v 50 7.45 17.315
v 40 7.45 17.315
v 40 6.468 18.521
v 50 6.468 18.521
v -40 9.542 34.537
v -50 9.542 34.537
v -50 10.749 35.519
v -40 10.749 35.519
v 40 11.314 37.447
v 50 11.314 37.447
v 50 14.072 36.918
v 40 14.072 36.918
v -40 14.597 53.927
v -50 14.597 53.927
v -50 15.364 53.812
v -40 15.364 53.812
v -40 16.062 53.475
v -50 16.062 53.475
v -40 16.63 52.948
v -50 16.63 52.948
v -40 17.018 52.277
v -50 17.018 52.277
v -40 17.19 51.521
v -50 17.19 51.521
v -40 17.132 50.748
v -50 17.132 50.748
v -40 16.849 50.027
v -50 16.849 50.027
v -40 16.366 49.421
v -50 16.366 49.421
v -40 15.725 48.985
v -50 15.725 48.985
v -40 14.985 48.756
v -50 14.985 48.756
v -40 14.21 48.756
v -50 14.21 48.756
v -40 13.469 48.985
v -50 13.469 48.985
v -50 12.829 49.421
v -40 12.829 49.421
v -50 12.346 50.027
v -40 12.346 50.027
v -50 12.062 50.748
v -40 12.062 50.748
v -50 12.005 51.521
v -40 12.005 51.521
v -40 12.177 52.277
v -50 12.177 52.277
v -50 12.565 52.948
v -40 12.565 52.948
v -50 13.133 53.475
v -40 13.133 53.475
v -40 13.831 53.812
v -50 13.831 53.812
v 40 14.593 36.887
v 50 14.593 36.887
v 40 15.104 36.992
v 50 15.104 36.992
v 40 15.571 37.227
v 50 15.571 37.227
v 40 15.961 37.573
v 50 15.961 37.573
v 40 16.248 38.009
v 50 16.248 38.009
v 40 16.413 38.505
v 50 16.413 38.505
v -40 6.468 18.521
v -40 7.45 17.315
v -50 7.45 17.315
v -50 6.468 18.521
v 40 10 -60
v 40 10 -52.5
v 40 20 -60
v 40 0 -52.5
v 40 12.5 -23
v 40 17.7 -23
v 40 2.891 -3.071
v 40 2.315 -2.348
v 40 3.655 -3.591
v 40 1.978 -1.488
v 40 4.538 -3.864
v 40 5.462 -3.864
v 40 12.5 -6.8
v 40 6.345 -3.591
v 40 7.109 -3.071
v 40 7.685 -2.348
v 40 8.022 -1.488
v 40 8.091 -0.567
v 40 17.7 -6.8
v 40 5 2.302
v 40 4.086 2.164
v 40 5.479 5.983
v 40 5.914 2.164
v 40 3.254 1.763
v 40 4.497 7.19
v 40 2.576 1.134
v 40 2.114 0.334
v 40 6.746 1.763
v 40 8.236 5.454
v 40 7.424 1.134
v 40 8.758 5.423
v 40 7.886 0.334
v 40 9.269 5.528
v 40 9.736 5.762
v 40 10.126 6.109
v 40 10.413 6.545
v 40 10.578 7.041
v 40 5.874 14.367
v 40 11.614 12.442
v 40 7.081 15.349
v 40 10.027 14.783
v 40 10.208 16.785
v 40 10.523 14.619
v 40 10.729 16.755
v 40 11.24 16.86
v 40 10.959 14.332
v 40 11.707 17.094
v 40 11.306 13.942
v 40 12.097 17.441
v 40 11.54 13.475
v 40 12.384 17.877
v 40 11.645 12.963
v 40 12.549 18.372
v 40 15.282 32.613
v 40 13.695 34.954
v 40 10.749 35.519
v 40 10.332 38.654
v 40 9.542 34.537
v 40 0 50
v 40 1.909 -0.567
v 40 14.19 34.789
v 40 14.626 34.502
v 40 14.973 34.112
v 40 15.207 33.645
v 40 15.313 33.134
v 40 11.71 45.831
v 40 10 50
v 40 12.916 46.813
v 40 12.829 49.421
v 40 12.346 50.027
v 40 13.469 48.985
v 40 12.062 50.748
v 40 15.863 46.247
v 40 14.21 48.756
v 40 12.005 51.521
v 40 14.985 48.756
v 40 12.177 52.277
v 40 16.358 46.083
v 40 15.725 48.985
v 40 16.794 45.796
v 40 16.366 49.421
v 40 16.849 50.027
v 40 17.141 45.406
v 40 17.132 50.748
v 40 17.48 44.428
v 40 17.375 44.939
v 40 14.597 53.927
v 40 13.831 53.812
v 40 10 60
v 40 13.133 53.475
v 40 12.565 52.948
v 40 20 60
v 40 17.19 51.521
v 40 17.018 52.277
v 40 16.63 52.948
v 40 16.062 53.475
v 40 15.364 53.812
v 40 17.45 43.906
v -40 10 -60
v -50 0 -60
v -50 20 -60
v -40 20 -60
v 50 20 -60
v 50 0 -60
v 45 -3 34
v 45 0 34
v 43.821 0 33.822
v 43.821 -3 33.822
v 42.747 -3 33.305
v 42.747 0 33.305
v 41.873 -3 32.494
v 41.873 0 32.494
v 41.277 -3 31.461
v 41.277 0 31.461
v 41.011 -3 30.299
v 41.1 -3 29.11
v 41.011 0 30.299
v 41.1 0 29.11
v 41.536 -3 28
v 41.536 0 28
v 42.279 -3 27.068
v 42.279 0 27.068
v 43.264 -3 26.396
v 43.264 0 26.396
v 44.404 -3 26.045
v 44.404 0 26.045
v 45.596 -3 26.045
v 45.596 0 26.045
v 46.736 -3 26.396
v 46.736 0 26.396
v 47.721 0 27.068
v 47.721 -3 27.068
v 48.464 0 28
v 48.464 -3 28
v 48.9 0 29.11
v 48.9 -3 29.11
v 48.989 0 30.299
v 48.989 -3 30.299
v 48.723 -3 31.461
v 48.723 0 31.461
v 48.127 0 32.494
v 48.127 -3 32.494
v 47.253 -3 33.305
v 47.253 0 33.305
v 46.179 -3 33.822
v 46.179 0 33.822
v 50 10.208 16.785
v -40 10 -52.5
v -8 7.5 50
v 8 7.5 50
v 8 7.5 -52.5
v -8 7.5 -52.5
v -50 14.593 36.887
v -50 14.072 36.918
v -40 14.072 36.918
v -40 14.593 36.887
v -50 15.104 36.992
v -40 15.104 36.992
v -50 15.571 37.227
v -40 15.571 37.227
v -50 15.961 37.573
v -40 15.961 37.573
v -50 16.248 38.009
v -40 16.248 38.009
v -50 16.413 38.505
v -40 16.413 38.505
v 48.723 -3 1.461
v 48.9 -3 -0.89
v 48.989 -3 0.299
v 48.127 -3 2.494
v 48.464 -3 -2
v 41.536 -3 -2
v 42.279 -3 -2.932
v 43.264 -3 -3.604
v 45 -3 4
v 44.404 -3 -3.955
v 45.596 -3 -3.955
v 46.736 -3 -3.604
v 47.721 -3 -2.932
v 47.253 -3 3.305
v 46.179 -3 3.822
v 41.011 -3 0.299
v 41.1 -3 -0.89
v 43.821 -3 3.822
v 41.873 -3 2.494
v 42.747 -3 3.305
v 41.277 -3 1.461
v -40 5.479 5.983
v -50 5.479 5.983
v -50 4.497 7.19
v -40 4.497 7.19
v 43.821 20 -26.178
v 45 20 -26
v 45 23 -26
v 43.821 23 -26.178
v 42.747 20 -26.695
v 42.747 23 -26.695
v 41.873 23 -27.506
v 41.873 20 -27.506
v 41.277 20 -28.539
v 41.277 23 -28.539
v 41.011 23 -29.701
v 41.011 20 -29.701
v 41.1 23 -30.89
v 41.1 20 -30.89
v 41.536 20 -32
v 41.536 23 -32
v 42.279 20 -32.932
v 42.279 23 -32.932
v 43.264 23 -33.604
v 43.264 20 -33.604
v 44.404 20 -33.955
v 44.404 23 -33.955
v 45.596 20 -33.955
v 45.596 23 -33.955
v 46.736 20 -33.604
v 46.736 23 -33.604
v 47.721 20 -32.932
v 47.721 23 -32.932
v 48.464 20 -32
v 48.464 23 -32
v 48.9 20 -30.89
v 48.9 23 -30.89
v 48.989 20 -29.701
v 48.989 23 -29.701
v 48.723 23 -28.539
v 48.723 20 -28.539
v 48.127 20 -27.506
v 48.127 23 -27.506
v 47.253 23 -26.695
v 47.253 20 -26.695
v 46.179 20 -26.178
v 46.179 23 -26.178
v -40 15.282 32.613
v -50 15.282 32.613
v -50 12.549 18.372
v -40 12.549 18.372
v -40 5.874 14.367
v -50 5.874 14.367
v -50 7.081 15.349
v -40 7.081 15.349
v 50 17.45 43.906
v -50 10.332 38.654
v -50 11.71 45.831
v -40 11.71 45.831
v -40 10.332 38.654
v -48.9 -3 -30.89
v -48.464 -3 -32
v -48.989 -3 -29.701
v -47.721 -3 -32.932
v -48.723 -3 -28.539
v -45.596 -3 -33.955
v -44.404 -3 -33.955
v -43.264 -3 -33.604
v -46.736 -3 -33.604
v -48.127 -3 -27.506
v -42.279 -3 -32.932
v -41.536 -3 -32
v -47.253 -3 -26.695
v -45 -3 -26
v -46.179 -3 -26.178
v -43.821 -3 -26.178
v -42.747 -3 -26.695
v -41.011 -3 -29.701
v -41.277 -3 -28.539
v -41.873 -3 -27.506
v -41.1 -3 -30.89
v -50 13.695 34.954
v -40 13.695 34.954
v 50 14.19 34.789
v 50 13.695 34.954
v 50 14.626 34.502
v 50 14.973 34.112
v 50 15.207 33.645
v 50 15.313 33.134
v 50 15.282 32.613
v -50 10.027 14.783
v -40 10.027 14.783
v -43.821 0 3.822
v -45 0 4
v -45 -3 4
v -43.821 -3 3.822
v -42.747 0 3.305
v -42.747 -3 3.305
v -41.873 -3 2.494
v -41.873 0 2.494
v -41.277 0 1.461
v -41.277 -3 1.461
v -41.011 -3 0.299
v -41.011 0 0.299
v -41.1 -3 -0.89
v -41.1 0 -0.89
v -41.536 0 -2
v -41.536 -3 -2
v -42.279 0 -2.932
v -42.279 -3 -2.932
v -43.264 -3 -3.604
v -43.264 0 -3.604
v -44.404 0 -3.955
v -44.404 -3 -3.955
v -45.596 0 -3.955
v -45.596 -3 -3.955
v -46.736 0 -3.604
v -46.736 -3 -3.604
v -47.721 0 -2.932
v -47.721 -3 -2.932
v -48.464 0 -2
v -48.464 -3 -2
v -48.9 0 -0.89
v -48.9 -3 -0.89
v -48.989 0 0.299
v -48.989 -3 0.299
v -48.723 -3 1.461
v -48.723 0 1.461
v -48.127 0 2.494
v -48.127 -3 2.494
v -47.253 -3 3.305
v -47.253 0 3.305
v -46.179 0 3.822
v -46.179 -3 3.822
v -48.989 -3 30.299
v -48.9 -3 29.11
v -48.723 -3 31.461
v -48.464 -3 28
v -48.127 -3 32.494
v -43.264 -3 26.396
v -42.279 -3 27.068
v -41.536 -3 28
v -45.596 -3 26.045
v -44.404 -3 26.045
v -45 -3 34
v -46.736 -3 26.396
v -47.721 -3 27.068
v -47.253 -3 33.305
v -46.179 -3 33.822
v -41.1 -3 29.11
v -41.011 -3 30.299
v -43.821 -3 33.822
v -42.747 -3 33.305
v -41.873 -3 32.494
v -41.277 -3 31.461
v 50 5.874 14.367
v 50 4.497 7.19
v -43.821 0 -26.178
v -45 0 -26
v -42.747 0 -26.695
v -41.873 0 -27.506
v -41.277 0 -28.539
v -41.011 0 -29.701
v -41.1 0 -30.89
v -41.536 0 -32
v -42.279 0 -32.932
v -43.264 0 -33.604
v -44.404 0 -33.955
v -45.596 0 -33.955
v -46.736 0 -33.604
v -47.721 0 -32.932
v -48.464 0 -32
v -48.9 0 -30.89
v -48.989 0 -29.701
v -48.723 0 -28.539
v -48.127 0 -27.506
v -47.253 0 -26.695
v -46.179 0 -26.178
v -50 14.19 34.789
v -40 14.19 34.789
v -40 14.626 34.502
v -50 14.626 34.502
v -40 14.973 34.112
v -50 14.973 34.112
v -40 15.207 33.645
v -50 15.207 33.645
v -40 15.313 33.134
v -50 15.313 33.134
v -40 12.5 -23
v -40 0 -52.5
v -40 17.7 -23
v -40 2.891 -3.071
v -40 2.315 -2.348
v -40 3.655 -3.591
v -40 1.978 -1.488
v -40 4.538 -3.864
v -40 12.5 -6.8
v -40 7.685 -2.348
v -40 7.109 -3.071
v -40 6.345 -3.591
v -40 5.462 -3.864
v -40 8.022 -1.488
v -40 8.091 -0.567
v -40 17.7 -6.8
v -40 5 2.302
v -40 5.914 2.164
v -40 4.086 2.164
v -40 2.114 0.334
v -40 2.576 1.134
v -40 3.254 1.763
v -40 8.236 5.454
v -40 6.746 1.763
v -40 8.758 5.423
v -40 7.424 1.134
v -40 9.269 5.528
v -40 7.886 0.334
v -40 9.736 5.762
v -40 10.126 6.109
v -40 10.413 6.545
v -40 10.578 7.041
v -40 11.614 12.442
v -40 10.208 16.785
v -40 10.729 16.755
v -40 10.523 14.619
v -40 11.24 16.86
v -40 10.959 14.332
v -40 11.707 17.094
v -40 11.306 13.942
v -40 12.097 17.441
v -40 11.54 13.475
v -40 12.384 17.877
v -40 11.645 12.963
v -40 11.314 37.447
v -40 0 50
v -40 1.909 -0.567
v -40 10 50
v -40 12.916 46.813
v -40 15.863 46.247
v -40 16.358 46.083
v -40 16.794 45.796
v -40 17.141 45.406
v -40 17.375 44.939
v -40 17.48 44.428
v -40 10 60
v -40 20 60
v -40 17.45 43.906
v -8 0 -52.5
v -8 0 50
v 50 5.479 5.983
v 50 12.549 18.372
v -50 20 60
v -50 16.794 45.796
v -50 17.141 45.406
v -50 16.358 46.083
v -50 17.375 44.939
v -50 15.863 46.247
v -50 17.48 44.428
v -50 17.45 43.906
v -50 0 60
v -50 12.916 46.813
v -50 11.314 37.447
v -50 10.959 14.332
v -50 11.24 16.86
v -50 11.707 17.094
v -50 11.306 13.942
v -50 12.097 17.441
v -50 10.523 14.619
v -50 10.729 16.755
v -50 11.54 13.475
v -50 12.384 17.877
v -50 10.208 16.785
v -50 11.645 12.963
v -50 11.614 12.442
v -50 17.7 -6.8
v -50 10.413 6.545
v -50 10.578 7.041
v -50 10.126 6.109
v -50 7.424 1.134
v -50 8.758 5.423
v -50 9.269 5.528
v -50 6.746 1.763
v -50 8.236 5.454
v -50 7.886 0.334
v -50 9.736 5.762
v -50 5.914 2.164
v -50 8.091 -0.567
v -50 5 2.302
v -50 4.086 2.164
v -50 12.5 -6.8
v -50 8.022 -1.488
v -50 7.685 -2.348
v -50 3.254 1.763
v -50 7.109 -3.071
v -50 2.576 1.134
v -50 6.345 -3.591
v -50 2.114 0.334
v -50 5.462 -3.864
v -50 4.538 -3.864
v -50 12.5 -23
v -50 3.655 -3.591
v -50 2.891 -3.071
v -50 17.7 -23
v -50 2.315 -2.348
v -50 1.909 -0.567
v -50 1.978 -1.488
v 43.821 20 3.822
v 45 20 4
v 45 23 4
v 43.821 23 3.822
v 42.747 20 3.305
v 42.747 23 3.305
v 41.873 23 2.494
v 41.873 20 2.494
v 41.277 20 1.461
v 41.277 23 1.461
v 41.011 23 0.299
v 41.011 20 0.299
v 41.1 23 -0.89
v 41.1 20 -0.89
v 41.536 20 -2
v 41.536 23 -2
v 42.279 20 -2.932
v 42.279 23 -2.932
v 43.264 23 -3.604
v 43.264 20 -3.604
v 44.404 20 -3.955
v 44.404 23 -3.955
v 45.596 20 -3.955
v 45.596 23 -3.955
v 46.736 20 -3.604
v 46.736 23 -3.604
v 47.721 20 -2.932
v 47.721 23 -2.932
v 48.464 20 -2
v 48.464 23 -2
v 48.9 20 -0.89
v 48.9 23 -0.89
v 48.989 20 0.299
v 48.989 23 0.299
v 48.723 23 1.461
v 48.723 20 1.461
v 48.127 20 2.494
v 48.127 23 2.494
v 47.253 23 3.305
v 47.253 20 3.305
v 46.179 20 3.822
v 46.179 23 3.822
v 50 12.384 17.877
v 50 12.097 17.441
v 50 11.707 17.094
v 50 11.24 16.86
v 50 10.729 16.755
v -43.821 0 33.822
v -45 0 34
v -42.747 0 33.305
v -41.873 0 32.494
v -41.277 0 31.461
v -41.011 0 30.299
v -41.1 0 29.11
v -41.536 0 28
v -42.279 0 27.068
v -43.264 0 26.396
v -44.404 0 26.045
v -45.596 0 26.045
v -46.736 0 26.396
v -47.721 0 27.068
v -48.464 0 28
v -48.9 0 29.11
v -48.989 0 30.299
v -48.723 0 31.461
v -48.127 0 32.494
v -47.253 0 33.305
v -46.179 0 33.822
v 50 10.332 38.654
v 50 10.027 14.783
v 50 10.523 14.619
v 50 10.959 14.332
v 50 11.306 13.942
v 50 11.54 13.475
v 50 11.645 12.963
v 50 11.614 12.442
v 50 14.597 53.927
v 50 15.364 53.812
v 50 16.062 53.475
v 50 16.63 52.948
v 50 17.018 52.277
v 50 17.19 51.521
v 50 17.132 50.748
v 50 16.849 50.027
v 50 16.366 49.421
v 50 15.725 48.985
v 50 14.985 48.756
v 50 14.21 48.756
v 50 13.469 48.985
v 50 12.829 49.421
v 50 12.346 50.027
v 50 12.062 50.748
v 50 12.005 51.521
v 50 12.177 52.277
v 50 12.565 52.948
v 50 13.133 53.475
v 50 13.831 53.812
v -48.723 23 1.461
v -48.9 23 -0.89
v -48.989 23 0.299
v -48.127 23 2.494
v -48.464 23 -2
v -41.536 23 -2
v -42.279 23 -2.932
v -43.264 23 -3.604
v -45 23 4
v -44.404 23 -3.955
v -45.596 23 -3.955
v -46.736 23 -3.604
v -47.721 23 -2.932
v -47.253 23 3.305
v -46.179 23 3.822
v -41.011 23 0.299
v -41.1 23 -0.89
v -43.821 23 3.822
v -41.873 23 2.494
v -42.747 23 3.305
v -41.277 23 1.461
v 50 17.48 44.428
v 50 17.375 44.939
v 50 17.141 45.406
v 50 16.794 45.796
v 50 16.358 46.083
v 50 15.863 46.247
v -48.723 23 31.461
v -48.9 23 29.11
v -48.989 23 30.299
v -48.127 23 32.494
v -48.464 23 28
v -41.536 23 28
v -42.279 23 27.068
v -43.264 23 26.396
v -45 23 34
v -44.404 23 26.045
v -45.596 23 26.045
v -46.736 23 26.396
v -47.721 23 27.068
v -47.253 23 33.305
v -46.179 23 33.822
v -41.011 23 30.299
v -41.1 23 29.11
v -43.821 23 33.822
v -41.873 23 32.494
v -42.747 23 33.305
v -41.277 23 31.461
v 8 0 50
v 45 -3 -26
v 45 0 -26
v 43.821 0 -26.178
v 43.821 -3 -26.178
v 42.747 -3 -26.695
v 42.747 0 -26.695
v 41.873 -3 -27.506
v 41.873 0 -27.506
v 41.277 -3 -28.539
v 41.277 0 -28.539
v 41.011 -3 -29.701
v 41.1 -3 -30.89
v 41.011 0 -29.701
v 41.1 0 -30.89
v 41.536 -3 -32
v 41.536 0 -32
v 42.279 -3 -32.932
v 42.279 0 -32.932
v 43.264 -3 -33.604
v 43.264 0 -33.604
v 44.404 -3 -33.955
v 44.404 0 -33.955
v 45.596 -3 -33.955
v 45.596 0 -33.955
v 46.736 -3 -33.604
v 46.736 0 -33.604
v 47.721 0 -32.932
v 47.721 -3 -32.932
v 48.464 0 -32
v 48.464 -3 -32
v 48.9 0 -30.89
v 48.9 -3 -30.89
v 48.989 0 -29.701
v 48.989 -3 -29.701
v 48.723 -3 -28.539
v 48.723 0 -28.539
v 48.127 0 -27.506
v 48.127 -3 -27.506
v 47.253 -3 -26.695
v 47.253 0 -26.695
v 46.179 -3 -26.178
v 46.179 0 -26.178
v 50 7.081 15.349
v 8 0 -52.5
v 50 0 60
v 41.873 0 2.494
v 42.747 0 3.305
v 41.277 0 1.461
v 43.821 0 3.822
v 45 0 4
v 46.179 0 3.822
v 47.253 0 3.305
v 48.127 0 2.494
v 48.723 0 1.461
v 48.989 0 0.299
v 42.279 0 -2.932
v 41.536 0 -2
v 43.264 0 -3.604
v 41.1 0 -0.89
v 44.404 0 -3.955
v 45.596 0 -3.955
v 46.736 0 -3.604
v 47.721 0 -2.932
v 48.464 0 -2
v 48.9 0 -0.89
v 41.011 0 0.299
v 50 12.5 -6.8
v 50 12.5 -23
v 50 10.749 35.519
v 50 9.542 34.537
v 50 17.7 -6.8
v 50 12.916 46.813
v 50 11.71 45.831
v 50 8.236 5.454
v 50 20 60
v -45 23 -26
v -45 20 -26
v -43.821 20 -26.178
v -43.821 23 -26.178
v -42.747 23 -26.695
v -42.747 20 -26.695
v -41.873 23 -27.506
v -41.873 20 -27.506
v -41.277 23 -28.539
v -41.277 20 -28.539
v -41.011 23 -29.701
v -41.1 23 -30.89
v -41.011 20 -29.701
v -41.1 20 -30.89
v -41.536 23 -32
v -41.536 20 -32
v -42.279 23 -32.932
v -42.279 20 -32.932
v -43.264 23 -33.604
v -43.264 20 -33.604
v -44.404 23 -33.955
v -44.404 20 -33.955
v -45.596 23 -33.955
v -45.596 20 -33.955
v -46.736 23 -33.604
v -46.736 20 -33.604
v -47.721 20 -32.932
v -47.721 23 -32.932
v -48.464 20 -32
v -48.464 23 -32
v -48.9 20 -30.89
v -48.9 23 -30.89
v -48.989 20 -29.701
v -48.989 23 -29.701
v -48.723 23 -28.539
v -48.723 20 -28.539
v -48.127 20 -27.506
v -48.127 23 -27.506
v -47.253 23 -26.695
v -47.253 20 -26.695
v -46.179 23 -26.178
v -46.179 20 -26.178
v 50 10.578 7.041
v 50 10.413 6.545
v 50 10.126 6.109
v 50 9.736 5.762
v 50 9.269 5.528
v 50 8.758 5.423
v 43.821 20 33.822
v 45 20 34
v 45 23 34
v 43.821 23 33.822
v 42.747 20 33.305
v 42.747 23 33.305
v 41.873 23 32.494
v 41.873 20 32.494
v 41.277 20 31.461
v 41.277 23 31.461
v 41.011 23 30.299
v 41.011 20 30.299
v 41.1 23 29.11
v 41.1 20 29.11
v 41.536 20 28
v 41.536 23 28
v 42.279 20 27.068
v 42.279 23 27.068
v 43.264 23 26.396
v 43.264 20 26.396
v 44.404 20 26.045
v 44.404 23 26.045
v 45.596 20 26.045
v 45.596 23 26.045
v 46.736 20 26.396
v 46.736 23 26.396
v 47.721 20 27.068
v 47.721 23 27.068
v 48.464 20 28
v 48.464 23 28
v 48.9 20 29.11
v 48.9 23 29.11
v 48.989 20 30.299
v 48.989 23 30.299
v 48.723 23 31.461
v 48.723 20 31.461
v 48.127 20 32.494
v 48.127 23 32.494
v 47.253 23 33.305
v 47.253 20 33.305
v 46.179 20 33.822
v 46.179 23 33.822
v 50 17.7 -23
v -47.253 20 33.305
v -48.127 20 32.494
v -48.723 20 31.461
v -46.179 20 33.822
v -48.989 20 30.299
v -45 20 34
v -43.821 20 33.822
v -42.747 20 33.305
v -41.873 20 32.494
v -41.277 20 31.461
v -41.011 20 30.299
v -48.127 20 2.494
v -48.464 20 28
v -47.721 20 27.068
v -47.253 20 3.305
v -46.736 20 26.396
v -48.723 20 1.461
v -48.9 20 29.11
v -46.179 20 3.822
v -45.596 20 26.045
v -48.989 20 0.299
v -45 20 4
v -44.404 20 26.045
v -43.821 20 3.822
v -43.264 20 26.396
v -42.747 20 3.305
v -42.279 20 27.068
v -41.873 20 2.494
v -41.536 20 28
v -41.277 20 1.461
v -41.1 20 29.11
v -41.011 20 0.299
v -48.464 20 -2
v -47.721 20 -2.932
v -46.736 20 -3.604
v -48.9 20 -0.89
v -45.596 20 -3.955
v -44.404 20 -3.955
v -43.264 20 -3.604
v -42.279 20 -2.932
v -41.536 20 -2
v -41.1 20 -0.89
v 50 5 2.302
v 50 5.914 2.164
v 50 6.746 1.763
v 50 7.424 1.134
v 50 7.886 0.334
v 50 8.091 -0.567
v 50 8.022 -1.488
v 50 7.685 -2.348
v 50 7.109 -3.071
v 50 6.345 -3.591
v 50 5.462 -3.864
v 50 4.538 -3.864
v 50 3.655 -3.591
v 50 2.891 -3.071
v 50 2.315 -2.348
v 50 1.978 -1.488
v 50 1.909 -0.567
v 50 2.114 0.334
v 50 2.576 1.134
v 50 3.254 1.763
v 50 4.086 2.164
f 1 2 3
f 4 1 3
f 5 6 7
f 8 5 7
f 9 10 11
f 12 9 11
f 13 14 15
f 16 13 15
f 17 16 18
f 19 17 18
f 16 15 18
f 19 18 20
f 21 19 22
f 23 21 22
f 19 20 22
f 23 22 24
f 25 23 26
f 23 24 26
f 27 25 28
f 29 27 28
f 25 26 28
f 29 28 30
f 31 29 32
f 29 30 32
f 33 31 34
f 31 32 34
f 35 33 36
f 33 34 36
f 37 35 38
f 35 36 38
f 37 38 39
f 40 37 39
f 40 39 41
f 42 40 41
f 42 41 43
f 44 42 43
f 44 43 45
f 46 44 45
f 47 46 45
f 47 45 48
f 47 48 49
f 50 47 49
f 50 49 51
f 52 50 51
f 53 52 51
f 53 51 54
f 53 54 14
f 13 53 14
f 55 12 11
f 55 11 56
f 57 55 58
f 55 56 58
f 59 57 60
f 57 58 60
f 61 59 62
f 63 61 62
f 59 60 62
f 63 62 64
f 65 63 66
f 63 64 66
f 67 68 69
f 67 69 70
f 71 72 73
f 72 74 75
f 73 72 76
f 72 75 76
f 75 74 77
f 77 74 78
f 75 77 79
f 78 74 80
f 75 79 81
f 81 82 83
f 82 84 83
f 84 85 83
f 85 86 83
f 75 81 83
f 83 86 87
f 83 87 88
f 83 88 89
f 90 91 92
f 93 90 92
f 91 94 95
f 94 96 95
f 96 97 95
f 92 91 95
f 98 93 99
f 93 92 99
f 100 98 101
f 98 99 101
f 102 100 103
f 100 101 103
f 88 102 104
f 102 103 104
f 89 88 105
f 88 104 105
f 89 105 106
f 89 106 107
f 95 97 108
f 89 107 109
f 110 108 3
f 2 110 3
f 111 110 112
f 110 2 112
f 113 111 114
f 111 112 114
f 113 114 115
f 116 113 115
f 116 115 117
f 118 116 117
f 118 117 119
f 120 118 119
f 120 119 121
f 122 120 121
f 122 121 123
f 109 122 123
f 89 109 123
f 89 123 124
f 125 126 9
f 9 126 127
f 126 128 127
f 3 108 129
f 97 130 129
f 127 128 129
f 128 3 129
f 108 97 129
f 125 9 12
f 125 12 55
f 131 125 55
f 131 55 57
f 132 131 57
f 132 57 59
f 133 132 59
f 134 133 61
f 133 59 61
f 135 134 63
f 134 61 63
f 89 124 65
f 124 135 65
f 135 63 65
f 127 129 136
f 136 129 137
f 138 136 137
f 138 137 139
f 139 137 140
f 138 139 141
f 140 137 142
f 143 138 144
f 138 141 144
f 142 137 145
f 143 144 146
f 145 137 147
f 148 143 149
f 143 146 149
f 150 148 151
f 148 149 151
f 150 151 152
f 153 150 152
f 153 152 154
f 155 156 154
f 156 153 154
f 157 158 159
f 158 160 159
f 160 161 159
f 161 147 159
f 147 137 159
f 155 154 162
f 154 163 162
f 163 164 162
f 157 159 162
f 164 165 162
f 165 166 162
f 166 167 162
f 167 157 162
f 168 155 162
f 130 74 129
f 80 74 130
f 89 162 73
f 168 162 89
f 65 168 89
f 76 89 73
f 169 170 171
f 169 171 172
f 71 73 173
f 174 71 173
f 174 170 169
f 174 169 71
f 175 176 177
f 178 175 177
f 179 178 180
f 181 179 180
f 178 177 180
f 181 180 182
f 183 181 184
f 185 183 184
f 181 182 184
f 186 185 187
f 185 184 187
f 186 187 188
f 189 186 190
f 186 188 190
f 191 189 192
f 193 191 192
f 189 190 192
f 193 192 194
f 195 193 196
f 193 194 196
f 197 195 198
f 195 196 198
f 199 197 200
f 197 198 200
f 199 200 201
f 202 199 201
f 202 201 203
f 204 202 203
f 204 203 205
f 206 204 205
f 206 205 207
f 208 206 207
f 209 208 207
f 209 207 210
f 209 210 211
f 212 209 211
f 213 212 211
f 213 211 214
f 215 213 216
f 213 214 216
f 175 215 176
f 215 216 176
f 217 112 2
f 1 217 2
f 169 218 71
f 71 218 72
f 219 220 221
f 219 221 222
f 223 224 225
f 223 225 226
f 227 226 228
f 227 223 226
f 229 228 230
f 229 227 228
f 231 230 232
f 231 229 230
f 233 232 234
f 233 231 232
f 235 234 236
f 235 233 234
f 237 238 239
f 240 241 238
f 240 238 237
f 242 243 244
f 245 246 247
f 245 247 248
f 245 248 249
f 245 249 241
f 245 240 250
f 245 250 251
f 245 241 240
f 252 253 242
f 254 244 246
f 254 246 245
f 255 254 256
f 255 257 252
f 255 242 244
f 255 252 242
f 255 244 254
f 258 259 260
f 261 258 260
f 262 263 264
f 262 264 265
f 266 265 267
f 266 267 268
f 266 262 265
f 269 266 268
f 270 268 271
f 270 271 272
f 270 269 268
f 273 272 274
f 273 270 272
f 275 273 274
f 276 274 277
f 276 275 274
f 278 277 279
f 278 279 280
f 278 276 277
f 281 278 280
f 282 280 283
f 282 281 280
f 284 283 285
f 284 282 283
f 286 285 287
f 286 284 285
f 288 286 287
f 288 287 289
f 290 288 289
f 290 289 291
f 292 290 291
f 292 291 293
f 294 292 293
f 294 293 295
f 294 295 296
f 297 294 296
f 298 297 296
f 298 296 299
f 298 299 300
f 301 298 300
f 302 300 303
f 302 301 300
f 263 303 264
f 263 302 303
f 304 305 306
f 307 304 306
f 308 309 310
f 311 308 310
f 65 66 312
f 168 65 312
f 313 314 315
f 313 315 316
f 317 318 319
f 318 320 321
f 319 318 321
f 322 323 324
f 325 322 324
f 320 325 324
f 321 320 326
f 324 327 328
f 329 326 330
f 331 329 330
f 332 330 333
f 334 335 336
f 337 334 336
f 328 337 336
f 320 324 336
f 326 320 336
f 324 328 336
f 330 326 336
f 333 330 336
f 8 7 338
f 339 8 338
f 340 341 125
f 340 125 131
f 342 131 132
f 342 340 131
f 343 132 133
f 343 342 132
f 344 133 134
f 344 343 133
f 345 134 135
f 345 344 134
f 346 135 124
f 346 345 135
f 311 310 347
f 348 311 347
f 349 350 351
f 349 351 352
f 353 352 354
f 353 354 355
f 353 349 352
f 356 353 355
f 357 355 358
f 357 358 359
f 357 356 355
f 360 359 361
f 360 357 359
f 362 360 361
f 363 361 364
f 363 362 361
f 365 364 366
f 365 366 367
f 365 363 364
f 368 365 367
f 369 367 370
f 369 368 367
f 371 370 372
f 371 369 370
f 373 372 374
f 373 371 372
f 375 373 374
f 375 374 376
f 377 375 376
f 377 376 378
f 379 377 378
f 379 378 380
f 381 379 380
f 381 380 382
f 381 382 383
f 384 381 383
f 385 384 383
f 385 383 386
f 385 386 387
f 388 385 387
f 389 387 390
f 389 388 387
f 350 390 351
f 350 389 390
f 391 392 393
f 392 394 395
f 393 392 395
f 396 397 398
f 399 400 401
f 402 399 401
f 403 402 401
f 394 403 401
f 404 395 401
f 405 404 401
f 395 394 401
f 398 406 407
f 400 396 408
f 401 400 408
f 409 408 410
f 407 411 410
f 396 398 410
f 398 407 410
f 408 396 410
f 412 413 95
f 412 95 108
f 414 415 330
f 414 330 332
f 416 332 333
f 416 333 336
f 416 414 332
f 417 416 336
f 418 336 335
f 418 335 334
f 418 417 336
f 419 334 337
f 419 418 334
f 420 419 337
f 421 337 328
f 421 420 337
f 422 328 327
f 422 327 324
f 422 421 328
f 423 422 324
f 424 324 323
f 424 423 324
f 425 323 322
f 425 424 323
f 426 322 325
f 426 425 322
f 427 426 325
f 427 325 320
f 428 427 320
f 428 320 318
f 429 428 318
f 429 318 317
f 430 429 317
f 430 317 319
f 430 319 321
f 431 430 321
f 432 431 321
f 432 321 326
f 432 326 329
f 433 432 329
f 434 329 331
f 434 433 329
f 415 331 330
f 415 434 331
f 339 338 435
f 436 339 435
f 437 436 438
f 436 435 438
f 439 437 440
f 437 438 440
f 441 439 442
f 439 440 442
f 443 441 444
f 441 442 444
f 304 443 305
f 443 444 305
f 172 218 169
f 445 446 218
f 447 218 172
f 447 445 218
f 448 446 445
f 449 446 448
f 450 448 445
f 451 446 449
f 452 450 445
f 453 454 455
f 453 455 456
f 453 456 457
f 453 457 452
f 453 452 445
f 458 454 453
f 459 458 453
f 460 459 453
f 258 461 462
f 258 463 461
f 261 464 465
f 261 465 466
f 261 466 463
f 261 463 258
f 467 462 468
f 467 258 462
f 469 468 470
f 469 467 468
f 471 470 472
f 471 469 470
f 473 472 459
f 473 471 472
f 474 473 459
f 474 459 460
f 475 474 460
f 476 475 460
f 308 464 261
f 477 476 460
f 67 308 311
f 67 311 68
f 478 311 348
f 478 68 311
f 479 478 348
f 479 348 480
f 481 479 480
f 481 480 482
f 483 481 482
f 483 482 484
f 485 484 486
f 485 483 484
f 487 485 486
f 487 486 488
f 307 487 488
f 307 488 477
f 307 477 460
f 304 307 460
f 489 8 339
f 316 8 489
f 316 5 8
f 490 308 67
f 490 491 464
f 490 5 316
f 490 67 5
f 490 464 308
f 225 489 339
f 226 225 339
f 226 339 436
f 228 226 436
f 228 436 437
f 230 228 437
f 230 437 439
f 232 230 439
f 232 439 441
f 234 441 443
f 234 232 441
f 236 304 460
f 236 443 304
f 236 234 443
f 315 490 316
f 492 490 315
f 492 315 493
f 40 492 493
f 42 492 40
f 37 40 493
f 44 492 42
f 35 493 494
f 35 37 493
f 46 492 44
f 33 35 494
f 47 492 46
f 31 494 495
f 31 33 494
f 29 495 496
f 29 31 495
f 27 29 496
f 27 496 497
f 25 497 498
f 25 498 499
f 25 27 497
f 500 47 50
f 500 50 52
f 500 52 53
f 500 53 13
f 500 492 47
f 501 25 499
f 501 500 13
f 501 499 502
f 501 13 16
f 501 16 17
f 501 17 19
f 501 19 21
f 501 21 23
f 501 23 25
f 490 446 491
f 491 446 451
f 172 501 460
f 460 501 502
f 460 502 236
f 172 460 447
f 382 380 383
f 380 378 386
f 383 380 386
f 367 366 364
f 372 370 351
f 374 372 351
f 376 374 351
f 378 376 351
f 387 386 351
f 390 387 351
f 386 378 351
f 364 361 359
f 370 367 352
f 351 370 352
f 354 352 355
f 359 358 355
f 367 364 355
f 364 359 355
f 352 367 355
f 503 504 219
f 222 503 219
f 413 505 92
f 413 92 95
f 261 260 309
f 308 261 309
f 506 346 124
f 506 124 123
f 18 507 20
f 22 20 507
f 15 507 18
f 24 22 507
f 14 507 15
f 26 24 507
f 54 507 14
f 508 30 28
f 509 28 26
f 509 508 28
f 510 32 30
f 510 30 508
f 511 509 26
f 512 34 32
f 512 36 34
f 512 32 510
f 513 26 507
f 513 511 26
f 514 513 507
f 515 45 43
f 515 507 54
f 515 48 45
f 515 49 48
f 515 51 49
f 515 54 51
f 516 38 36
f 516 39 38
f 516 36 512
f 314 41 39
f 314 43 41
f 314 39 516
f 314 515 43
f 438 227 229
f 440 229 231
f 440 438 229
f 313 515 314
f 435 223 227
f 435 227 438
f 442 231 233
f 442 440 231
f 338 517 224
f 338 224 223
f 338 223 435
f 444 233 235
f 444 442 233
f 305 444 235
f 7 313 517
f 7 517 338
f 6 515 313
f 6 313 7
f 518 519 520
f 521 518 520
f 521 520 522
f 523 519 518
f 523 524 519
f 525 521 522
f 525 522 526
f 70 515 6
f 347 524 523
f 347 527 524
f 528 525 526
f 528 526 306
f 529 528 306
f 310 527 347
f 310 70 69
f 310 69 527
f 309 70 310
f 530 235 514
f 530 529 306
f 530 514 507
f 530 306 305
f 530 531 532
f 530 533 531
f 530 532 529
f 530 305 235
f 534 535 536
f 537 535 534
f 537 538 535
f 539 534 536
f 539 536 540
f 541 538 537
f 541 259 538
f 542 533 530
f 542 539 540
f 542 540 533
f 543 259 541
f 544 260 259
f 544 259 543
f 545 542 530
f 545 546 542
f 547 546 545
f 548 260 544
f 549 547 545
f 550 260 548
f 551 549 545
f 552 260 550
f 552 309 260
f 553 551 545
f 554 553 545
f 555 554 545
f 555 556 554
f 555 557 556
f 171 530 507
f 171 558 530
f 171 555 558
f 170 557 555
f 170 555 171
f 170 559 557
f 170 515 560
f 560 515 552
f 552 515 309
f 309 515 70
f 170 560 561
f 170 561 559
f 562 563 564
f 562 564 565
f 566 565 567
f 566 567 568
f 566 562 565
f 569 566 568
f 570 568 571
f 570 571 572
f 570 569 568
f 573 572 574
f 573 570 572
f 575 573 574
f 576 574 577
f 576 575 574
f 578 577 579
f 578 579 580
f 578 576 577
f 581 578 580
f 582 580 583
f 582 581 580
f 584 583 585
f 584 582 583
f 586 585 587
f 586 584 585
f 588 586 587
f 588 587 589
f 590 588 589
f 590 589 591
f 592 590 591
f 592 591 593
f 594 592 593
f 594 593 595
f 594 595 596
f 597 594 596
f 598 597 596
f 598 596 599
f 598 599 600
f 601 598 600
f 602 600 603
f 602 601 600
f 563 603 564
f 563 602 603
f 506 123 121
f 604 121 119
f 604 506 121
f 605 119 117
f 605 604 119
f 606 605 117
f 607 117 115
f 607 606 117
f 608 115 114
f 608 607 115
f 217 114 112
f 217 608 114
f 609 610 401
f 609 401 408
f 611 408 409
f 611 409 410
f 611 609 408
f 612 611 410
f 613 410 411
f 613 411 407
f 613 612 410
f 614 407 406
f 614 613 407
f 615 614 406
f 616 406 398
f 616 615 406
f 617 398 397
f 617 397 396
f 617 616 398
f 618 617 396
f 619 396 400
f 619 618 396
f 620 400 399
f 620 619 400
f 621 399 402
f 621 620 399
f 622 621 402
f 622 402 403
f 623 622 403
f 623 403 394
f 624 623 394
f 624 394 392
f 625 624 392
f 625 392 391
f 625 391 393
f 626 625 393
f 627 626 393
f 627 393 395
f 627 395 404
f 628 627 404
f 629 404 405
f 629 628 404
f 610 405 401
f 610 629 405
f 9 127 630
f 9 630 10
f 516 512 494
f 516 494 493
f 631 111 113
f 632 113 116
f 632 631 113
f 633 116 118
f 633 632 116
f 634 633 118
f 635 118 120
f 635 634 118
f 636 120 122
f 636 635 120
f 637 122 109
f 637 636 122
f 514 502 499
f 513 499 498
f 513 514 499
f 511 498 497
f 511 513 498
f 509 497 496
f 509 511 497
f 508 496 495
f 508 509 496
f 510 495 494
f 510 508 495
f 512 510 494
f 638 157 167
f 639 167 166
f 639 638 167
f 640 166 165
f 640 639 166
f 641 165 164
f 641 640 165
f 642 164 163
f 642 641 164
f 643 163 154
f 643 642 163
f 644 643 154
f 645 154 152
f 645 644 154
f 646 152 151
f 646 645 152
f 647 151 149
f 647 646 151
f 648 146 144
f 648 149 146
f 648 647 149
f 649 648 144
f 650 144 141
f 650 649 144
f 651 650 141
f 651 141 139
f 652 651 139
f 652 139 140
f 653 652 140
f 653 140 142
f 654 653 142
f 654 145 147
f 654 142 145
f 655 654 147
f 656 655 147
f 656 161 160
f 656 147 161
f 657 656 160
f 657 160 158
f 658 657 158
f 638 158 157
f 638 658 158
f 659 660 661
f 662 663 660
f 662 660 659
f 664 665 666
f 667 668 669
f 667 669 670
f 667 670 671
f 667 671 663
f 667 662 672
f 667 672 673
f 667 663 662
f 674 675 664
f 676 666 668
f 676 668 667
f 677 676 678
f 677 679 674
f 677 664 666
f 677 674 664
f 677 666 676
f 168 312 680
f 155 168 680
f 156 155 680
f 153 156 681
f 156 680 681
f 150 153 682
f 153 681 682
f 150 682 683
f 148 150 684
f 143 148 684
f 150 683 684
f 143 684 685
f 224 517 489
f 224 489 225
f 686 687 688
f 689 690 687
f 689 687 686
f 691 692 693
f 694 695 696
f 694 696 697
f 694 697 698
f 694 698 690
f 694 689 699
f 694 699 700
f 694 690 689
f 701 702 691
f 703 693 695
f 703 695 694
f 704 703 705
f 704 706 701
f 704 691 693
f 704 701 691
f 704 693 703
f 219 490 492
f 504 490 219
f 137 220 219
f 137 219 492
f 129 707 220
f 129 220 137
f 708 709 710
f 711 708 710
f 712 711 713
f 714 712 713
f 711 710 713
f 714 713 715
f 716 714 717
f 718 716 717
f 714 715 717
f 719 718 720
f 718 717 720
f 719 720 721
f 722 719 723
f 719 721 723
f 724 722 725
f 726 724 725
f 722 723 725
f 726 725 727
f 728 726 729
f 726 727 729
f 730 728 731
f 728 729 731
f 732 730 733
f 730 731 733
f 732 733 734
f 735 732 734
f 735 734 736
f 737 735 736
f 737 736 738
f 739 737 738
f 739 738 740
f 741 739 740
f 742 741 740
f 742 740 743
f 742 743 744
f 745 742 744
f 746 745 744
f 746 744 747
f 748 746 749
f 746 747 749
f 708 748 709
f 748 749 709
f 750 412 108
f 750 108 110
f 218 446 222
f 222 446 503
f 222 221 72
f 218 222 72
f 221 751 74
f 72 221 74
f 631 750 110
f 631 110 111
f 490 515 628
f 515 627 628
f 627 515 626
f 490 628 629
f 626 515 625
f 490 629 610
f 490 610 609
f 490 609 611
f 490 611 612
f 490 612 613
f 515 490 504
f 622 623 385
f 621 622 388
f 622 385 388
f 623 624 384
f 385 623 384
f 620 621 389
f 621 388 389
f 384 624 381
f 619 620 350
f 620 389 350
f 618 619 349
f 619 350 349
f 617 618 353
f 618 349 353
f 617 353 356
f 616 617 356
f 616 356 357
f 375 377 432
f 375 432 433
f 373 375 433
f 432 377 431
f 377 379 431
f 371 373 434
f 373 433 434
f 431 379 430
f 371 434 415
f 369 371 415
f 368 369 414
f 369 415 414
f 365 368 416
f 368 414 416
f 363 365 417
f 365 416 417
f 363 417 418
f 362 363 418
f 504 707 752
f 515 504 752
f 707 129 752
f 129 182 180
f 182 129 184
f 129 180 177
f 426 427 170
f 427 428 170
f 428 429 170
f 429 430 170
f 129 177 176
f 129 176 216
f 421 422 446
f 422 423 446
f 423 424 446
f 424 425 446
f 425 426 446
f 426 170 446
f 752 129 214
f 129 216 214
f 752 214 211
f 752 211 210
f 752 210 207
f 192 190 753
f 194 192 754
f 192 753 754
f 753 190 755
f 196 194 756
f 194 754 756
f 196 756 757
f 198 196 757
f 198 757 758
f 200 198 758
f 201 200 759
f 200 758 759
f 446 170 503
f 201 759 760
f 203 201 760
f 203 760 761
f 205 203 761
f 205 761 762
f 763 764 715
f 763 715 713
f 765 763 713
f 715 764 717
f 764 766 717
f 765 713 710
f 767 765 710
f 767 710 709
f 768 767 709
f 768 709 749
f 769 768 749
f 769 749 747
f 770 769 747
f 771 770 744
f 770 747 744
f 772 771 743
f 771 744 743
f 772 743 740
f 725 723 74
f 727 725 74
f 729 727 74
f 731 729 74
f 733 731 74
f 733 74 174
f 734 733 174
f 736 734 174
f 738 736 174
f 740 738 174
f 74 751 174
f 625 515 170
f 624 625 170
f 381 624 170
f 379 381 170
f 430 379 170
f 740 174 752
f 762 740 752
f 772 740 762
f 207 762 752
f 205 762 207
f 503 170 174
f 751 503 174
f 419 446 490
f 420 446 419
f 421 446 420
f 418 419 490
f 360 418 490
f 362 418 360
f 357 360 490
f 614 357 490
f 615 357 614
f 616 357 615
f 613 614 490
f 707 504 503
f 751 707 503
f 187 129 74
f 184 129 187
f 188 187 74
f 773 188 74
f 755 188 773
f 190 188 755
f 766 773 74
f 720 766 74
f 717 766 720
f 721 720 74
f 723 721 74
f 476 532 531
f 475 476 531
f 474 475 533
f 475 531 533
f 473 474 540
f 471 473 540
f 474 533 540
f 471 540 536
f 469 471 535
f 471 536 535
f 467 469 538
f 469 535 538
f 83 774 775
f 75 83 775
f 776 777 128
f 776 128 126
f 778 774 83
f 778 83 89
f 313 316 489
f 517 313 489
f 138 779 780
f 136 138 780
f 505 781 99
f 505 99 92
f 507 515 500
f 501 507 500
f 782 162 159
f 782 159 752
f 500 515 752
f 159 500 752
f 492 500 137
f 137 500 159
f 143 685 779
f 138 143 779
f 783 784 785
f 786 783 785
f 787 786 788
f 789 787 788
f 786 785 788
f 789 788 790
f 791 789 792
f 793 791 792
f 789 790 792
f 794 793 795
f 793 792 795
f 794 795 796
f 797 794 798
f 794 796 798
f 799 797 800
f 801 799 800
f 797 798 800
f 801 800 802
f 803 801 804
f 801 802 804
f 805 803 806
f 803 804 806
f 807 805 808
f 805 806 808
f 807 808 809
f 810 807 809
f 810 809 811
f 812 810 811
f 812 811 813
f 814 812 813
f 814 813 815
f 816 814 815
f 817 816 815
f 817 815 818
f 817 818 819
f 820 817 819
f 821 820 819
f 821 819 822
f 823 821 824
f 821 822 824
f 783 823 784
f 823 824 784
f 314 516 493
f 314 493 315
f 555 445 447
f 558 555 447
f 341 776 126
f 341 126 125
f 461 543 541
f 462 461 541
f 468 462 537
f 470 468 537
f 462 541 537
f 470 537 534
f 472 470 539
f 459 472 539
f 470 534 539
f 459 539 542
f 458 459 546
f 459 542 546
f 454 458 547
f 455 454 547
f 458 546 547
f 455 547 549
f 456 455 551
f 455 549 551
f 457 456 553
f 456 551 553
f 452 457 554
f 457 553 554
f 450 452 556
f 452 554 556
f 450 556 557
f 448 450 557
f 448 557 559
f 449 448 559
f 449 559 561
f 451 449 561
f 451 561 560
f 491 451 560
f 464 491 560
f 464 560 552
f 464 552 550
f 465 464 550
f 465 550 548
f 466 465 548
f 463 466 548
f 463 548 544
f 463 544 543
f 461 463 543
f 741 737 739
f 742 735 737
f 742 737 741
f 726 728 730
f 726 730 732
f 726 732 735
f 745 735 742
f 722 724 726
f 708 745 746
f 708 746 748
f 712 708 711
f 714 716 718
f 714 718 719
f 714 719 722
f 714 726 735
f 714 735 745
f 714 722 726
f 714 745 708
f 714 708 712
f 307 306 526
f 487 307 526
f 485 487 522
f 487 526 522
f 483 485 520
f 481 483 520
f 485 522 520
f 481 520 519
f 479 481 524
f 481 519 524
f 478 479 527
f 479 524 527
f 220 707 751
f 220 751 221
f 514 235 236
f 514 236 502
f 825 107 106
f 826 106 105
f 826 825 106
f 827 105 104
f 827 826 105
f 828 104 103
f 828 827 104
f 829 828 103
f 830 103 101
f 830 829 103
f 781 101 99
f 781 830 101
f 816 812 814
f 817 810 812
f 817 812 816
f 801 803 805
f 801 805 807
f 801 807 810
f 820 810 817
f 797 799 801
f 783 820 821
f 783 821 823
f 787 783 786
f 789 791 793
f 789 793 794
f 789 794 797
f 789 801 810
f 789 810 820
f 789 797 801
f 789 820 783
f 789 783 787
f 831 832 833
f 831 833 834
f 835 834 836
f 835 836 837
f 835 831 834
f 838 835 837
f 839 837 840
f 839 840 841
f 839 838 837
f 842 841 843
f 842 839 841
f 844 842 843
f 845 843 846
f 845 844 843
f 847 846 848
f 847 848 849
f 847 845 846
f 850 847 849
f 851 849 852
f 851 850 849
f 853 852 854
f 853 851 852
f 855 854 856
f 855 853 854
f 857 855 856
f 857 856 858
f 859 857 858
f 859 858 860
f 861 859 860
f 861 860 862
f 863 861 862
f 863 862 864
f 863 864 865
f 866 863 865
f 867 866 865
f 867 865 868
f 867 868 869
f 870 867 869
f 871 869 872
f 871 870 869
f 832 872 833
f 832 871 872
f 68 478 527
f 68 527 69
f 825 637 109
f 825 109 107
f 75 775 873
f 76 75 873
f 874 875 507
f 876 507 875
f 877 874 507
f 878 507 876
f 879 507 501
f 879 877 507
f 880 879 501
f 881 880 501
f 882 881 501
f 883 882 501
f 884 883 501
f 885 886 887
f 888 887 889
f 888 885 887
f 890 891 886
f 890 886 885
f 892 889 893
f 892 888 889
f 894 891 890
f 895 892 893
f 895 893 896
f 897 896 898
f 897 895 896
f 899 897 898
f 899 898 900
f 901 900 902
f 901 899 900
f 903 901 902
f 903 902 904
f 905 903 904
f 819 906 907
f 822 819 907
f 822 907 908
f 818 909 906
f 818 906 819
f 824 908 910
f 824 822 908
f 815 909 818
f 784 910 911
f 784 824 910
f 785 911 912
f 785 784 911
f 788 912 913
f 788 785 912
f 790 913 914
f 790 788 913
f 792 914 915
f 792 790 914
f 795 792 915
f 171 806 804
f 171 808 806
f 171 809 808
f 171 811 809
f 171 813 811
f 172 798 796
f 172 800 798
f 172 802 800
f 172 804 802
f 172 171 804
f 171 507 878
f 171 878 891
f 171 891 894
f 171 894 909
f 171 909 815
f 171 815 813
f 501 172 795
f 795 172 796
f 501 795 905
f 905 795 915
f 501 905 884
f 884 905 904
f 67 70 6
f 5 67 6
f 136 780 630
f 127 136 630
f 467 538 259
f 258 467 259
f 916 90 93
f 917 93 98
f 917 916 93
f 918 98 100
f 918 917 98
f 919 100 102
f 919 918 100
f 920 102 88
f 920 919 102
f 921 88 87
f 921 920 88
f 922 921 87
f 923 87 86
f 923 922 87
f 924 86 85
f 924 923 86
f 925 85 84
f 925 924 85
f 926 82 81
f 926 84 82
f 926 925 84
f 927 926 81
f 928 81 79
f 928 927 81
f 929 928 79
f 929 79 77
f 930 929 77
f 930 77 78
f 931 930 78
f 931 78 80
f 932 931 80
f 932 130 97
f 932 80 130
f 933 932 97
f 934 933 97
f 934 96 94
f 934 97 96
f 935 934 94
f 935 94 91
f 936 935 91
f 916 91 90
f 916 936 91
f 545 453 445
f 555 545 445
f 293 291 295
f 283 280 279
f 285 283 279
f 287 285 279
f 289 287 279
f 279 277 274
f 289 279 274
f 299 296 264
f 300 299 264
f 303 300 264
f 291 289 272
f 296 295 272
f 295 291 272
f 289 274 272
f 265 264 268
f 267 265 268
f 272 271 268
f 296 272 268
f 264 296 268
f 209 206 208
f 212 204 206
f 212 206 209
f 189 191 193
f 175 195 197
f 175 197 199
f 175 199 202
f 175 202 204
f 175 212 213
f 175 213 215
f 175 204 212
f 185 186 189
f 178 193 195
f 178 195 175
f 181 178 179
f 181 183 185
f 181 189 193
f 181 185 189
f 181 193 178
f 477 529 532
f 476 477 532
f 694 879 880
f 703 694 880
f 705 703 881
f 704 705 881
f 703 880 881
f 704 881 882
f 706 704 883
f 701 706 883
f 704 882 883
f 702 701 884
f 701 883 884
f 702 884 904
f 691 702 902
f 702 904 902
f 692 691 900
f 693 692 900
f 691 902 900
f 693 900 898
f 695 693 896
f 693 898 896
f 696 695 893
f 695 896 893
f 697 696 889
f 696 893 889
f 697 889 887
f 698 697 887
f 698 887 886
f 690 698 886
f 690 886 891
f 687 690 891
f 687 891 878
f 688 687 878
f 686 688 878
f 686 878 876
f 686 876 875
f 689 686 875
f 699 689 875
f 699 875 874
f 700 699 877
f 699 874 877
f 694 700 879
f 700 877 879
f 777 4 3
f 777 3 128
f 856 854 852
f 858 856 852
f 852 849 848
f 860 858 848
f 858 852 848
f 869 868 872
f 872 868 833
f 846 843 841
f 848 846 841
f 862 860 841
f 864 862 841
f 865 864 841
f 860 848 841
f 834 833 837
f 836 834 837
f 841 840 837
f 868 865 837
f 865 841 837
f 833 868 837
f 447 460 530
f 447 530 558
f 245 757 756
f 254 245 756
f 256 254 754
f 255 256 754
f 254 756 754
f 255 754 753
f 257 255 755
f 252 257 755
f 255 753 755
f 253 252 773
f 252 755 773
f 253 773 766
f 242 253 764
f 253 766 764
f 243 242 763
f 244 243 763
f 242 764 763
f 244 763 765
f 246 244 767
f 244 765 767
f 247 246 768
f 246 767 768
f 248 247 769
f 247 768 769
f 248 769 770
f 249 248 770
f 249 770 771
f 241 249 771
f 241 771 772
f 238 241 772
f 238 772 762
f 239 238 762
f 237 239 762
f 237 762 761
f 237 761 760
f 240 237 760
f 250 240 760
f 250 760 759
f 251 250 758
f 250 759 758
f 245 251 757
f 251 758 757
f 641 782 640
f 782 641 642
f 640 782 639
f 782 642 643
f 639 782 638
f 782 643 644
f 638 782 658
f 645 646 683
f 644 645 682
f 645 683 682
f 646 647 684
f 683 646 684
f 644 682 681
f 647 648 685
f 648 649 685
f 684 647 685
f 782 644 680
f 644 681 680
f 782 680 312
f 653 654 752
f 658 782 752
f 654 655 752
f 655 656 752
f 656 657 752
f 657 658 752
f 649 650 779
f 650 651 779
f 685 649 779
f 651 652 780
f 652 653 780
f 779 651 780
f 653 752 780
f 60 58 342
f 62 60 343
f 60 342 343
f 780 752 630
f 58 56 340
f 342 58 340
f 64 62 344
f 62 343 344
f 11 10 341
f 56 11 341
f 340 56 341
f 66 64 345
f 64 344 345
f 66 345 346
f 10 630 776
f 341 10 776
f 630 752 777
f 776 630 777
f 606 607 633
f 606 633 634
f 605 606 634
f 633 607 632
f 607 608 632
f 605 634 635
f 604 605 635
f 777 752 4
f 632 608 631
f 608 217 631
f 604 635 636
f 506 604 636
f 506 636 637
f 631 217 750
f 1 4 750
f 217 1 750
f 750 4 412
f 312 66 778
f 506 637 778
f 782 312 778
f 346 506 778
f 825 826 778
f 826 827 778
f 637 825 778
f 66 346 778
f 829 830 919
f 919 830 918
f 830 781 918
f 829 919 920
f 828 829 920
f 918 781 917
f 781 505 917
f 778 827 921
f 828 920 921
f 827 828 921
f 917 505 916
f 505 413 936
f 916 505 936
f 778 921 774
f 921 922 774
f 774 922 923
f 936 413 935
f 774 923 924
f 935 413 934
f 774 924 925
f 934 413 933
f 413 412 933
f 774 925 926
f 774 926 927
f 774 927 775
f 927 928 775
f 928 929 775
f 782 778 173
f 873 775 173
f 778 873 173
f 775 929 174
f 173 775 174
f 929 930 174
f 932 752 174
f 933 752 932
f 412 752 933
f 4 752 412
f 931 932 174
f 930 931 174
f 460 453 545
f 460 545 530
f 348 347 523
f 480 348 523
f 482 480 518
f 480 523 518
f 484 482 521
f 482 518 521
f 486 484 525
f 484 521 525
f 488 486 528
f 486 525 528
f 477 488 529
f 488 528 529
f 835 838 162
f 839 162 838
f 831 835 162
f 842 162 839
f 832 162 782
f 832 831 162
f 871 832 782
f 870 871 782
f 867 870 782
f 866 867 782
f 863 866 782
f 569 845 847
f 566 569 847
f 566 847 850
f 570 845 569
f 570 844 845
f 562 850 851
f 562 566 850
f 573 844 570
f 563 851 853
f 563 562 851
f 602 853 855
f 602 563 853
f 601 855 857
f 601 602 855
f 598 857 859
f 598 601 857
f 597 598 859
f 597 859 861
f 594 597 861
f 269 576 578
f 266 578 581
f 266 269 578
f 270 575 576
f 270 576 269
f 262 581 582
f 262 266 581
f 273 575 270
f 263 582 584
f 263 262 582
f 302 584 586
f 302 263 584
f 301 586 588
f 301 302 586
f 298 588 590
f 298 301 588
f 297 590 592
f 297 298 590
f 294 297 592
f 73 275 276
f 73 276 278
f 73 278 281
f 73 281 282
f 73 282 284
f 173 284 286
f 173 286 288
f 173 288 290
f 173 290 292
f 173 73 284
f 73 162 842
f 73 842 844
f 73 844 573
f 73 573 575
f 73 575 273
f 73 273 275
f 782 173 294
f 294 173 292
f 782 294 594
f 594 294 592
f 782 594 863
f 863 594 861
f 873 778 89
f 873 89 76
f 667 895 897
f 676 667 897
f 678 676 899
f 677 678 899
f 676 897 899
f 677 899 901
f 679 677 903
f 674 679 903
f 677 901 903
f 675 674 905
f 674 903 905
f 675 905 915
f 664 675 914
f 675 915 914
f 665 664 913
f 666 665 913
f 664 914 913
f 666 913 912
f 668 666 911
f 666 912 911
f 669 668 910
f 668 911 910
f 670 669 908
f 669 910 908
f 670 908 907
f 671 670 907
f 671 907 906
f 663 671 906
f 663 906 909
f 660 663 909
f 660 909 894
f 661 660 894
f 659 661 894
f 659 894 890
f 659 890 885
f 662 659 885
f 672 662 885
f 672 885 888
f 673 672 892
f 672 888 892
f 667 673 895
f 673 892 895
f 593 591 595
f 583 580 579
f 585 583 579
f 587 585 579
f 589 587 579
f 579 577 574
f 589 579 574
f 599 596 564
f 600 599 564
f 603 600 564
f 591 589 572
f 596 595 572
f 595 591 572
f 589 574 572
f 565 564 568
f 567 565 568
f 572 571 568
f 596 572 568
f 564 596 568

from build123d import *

# Parameters (mm, degrees)
SKETCH1_W               = 100
SKETCH1_H               = 120
SKETCH1_W_2             = 80
SKETCH1_H_2             = 102.5
BOSS_EXTRUDE1_DEPTH     = 20
SKETCH2_R               = 4
BOSS_EXTRUDE2_DEPTH     = 3
MIRROR2_COPY_1_SKETCH_R = 4
MIRROR2_COPY_1_DEPTH    = 3
SKETCH8_W               = 80
SKETCH8_H               = 10
CUT_EXTRUDE5_DEPTH      = 133.018938035
SKETCH12_R              = 3.1
SKETCH12_R_2            = 2.6
CUT_EXTRUDE7_DEPTH      = 14
SKETCH15_W              = 16
SKETCH15_H              = 7.5
BOSS_EXTRUDE4_DEPTH     = 102.5
SKETCH18_W              = 16.2
SKETCH18_H              = 5.2
CUT_EXTRUDE10_DEPTH     = 119.865470175


with BuildPart() as part:
    # Sketch1 → Boss-Extrude1 (new body)
    with BuildSketch(Plane(origin=(0, 0, 0), x_dir=(1, 0, 0), z_dir=(0, 1, 0))):
        Rectangle(SKETCH1_W, SKETCH1_H)
        with Locations((0, 1.25)):
            Rectangle(SKETCH1_W_2, SKETCH1_H_2, mode=Mode.SUBTRACT)
    extrude(amount=BOSS_EXTRUDE1_DEPTH)

    # Sketch2 → Boss-Extrude2 (add)
    with BuildSketch(Plane(origin=(0, 20, 0), x_dir=(1, 0, 0), z_dir=(0, 1, 0))):
        with Locations(Location((-45, 30, 0), (0, 0, 270))):
            Circle(SKETCH2_R)
        with Locations(Location((-45, 0, 0), (0, 0, 270))):
            Circle(SKETCH2_R)
        with Locations(Location((-45, -30, 0), (0, 0, 270))):
            Circle(SKETCH2_R)
    boss_extrude2 = extrude(amount=BOSS_EXTRUDE2_DEPTH)

    # Mirror1: Boss-Extrude2 across plane
    add(boss_extrude2.mirror(Plane(origin=(0, 0, 0), x_dir=(0, 0, 1), z_dir=(1, 0, 0))))

    # Mirror2: Boss-Extrude2 across plane
    add(boss_extrude2.mirror(Plane.ZX.offset(10)))

    # Mirror2 copy 1 sketch → Mirror2 copy 1 (add)
    with BuildSketch(Plane(origin=(0, 0, 0), x_dir=(-1, 0, 0), z_dir=(0, -1, 0))):
        with Locations(Location((-45, 30, 0), (0, 0, 270))):
            Circle(MIRROR2_COPY_1_SKETCH_R)
        with Locations(Location((-45, 0, 0), (0, 0, 270))):
            Circle(MIRROR2_COPY_1_SKETCH_R)
        with Locations(Location((-45, -30, 0), (0, 0, 270))):
            Circle(MIRROR2_COPY_1_SKETCH_R)
    extrude(amount=MIRROR2_COPY_1_DEPTH)

    # Sketch8 → Cut-Extrude5 (cut, through all)
    with BuildSketch(Plane.XY.offset(60)):
        with Locations((0, 15)):
            Rectangle(SKETCH8_W, SKETCH8_H)
    extrude(amount=-CUT_EXTRUDE5_DEPTH, mode=Mode.SUBTRACT)

    # Sketch12 → Cut-Extrude7 (cut)
    with BuildSketch(Plane.ZY.offset(50)):
        with Locations((-0.798318999, 5)):
            Circle(SKETCH12_R)
        with Locations((51.32703264, 14.597276518)):
            Circle(SKETCH12_R_2)
        with BuildLine():
            Line((38.653830619, 10.332015619), (37.447119302, 11.313913997))
            Line((37.447119302, 11.313913997), (36.917785712, 14.071821507))
            ThreePointArc((36.917785712, 14.071821507), (37.226502949, 15.57110114), (38.504949796, 16.412955884))
            Line((38.504949796, 16.412955884), (43.90636018, 17.449665035))
            ThreePointArc((43.90636018, 17.449665035), (45.405639813, 17.140947797), (46.247494557, 15.86250095))
            Line((46.247494557, 15.86250095), (46.812972275, 12.916277104))
            Line((46.812972275, 12.916277104), (45.831073897, 11.709565788))
            Line((45.831073897, 11.709565788), (38.653830619, 10.332015619))
        make_face()
        with BuildLine():
            Line((35.5191142, 10.748612516), (34.953636481, 13.694836362))
            ThreePointArc((34.953636481, 13.694836362), (34.111781738, 14.973283209), (32.612502105, 15.282000446))
            Line((32.612502105, 15.282000446), (18.372420183, 12.548858139))
            ThreePointArc((18.372420183, 12.548858139), (17.093973336, 11.707003396), (16.785256099, 10.207723763))
            Line((16.785256099, 10.207723763), (17.314589689, 7.449816253))
            Line((17.314589689, 7.449816253), (18.521301006, 6.467917875))
            Line((18.521301006, 6.467917875), (34.537215822, 9.5419012))
            Line((34.537215822, 9.5419012), (35.5191142, 10.748612516))
        make_face()
        with BuildLine():
            Line((15.348886072, 7.080929694), (14.783408354, 10.02715354))
            ThreePointArc((14.783408354, 10.02715354), (13.94155361, 11.305600388), (12.442273977, 11.614317625))
            Line((12.442273977, 11.614317625), (7.040863593, 10.577608474))
            ThreePointArc((7.040863593, 10.577608474), (5.762416746, 9.735753731), (5.453699508, 8.236474098))
            Line((5.453699508, 8.236474098), (5.983033099, 5.478566587))
            Line((5.983033099, 5.478566587), (7.189744415, 4.496668209))
            Line((7.189744415, 4.496668209), (14.366987694, 5.874218378))
            Line((14.366987694, 5.874218378), (15.348886072, 7.080929694))
        make_face()
    cut_extrude7 = extrude(amount=-CUT_EXTRUDE7_DEPTH, mode=Mode.SUBTRACT)

    # Mirror5: Cut-Extrude7 across plane
    add(cut_extrude7.mirror(Plane(origin=(0, 0, 0), x_dir=(0, 0, 1), z_dir=(1, 0, 0))), mode=Mode.SUBTRACT)

    # Sketch15 → Boss-Extrude4 (add)
    with BuildSketch(Plane(origin=(0, 0, 50), x_dir=(-1, 0, 0), z_dir=(0, 0, -1))):
        with Locations((0, 3.75)):
            Rectangle(SKETCH15_W, SKETCH15_H)
    extrude(amount=BOSS_EXTRUDE4_DEPTH)

    # Sketch18 → Cut-Extrude10 (cut, through all)
    with BuildSketch(Plane(origin=(50, 0, 0), x_dir=(0, 0, -1), z_dir=(1, 0, 0))):
        with Locations((14.9, 15.1)):
            Rectangle(SKETCH18_W, SKETCH18_H)
    extrude(amount=-CUT_EXTRUDE10_DEPTH, mode=Mode.SUBTRACT)


solid = part.part
